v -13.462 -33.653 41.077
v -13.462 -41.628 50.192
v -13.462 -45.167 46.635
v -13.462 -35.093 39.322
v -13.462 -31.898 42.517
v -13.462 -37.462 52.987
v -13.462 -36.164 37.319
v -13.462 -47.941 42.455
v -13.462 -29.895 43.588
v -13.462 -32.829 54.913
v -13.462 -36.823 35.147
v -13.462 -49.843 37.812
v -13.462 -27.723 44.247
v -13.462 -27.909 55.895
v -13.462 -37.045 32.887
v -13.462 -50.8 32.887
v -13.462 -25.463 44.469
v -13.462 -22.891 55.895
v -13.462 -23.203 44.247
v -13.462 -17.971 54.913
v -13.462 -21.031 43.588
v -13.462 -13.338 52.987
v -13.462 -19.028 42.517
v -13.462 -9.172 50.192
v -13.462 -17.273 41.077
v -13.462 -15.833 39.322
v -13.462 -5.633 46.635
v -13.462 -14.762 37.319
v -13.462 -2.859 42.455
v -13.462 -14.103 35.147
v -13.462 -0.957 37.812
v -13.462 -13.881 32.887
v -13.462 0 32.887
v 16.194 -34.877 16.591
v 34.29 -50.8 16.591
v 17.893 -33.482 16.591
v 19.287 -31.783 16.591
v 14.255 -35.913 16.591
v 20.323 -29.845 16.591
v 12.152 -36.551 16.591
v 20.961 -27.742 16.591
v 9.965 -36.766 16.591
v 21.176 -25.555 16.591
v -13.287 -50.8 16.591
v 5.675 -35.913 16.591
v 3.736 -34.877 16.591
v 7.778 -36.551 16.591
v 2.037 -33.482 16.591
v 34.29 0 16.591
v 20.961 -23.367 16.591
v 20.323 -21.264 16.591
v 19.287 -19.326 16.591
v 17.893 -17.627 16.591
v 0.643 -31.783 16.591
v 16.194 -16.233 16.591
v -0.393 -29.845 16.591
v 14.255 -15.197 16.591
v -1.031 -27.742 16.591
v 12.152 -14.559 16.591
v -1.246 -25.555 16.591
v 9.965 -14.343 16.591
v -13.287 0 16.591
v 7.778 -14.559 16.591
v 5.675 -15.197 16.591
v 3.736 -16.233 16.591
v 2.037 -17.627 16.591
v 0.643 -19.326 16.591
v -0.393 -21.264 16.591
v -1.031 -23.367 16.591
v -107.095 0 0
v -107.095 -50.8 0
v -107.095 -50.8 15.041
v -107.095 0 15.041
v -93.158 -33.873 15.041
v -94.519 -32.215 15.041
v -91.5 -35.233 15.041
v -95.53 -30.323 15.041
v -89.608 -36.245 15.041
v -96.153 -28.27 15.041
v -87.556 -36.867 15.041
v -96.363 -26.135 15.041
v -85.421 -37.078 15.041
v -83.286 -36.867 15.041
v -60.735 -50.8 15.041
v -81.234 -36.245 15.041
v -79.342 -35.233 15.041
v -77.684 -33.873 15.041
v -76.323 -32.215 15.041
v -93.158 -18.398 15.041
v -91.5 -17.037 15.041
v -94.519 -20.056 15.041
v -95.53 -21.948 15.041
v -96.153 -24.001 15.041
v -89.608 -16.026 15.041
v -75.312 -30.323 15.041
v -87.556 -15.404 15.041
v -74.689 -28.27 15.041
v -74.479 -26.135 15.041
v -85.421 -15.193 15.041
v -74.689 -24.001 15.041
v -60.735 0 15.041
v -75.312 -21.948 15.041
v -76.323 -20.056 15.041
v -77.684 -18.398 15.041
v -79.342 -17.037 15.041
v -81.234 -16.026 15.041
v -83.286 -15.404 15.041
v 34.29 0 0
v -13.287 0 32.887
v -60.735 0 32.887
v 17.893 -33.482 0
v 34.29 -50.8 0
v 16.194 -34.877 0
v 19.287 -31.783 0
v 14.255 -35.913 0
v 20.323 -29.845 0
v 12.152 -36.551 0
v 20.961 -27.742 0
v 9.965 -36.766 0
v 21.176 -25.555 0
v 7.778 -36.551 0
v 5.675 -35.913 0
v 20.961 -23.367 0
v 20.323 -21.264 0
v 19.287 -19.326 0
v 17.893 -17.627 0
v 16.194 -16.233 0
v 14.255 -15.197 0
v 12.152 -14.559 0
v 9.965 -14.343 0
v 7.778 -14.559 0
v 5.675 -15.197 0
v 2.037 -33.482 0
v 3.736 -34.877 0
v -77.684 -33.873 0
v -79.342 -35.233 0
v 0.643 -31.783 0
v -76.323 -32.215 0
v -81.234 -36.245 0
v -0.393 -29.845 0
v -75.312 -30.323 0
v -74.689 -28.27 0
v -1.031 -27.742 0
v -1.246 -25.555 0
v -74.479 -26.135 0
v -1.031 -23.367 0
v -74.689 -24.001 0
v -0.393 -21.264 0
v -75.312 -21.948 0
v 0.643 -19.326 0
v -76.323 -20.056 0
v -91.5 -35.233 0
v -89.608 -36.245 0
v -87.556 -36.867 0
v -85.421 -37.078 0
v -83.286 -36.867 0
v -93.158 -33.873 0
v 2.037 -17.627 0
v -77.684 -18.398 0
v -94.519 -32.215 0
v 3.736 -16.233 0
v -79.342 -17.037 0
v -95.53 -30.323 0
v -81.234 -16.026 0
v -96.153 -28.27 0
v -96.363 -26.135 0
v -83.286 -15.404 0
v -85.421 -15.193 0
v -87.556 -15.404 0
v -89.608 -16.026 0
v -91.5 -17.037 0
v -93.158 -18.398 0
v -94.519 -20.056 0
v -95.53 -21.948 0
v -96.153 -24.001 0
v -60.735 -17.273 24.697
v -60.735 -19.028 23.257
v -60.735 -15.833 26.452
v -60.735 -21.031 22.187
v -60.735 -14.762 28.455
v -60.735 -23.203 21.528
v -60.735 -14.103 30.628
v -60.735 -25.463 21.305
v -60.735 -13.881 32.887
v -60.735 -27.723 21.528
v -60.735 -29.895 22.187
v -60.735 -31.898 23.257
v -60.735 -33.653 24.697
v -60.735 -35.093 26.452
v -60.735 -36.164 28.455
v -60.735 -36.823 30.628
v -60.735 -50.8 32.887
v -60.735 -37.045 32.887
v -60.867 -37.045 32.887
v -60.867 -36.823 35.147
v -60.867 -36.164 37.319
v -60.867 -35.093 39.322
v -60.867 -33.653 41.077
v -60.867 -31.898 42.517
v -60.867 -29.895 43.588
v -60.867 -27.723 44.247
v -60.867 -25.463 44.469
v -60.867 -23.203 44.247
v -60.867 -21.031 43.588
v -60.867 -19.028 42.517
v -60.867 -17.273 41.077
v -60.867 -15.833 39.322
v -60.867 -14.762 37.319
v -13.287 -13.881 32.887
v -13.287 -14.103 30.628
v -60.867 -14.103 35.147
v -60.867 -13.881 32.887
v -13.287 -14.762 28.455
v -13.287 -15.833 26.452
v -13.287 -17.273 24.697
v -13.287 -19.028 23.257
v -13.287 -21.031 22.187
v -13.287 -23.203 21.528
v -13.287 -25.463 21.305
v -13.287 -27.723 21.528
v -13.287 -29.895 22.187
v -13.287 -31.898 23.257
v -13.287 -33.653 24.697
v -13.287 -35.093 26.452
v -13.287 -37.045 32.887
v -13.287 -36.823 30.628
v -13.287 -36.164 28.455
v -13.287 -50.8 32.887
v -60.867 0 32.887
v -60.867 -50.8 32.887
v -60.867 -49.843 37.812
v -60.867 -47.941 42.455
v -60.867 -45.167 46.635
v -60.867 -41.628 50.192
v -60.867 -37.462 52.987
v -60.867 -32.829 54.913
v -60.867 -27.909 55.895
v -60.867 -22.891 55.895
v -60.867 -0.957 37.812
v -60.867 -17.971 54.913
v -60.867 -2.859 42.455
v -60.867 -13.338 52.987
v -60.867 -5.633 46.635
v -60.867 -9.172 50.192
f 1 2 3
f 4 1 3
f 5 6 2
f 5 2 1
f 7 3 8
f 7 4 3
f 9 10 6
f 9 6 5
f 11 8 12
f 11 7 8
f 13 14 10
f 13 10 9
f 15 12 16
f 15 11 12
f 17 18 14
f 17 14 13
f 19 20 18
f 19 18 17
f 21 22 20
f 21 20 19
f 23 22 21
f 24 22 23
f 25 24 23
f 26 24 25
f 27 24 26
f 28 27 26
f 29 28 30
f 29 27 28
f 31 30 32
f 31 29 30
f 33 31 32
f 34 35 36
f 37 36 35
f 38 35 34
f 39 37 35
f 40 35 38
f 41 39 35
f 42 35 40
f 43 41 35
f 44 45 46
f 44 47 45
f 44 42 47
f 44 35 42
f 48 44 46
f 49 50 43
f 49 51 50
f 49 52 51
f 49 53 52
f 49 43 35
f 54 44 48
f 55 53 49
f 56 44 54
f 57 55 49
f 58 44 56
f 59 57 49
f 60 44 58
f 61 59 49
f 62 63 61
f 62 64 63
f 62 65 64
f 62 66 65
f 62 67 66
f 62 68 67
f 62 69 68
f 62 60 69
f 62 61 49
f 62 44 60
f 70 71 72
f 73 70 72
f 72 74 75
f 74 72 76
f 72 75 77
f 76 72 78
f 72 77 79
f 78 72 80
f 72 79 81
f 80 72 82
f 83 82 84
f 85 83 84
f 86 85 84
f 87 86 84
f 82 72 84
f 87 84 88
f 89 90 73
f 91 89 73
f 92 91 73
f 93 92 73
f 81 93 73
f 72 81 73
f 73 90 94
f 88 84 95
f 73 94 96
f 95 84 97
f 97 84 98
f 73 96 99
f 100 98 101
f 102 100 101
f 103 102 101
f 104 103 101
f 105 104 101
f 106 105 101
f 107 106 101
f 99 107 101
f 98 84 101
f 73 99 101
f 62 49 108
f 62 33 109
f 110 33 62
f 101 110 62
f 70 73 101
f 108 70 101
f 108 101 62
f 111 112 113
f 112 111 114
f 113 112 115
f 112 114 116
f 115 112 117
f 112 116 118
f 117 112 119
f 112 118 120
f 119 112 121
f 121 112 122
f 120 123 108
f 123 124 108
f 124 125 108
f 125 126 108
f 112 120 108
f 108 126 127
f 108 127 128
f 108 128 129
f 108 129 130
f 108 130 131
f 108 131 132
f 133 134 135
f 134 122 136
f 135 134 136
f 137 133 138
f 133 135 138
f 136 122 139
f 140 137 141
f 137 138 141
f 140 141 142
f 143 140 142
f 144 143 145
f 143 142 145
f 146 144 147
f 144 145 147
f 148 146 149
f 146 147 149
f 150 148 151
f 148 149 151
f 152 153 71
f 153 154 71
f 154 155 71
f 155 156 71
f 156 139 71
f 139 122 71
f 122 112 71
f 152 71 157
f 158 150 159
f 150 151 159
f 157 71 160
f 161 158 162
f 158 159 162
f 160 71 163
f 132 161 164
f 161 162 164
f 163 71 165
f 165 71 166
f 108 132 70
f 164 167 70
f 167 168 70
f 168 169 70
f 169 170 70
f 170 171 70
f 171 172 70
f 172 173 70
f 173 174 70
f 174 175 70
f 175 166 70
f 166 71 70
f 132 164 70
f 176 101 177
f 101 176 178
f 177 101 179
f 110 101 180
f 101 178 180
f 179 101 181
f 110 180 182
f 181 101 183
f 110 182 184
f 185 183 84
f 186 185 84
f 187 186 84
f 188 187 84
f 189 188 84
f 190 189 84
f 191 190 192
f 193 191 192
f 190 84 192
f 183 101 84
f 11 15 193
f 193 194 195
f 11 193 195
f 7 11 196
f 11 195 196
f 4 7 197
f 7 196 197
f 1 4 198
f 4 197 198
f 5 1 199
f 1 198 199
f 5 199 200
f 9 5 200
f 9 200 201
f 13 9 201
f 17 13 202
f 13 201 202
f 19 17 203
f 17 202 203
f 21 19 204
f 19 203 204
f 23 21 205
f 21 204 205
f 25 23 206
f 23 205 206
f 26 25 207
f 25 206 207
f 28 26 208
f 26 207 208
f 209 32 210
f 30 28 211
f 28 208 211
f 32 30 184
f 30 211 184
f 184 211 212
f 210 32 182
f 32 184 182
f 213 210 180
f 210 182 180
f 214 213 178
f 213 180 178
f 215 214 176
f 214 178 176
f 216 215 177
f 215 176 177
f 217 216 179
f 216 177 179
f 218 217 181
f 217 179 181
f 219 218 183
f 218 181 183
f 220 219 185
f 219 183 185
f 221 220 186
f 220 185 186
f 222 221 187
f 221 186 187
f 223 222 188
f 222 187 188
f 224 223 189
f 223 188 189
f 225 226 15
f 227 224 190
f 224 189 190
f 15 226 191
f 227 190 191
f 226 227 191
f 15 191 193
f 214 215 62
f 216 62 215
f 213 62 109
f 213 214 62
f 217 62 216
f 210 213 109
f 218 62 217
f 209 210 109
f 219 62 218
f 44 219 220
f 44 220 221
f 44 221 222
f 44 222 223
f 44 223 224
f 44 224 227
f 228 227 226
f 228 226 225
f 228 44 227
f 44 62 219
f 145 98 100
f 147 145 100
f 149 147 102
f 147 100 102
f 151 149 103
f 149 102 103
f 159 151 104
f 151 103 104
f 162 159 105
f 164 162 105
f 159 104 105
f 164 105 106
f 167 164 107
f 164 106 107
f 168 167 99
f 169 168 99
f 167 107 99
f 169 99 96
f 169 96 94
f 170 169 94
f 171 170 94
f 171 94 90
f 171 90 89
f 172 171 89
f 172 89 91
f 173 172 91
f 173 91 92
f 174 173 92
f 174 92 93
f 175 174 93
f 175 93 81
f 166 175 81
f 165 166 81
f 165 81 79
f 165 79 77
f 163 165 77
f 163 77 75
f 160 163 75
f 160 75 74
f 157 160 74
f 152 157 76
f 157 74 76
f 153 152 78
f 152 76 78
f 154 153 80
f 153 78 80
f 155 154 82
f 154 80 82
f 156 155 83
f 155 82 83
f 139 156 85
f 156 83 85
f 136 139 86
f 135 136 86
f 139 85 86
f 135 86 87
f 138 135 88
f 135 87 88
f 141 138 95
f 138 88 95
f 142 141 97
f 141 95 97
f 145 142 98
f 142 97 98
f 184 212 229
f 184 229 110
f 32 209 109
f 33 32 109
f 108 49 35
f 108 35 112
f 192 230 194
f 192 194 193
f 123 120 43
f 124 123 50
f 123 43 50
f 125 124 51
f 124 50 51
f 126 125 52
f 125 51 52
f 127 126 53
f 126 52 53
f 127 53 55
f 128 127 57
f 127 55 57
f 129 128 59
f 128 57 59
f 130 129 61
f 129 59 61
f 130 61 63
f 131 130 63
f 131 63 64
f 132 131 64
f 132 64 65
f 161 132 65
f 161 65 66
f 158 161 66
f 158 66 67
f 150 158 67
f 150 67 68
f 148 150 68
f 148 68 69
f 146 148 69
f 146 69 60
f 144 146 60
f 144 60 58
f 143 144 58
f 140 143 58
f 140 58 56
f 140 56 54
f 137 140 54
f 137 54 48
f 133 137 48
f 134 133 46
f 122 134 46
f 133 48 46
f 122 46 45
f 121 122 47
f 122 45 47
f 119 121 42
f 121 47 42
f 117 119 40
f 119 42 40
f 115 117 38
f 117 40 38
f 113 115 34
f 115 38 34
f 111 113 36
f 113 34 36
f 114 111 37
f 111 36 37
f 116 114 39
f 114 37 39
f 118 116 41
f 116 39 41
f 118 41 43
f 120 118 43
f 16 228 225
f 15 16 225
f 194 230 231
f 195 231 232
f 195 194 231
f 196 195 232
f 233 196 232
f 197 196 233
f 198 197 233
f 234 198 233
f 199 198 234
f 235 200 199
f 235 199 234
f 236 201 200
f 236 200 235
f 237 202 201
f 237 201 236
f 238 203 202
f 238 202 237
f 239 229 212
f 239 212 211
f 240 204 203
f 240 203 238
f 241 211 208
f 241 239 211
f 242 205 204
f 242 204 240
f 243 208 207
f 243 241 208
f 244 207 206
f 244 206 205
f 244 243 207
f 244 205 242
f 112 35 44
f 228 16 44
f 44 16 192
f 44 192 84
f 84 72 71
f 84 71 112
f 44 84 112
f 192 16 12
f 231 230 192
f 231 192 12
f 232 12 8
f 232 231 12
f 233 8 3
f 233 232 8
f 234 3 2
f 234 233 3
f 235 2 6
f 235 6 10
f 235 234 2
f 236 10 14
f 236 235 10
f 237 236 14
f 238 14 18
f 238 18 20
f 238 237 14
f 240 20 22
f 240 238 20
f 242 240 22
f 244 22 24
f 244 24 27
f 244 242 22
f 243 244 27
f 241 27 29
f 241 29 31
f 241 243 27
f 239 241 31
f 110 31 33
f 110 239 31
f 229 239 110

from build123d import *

# Parameters (mm, degrees)
F0_W      = 74.5829641819
F0_H      = 30.8565702289
F1_DEPTH  = 25.4
F2_DEPTH  = 25.4
F3_DEPTH  = 25.4
F4_DEPTH  = 25.4
F6_DEPTH  = 25.4
F7_DEPTH  = 151.384
F8_DEPTH  = 25.4
F9_W      = 39.2481669128
F9_H      = 17.8465423578
F12_DEPTH = 60.198
F10_W     = 38.687005946
F10_H     = 16.2959610515
F13_DEPTH = 64.262
F14_DEPTH = 39.116
F15_DEPTH = 38.862
F16_DEPTH = 25.4
F17_DEPTH = 25.4
F19_DEPTH = 107.442
F21_DEPTH = 58.166
F22_DEPTH = 25.4
F23_DEPTH = 25.4
F24_DEPTH = 16.51
F25_DEPTH = 18.288
F26_R     = 11.2114596222
F27_DEPTH = 45.72
F28_R     = 10.9420459353
F29_DEPTH = 60.452


with BuildPart() as f1:
    # F0 (on Front) → F1 (new body)
    with BuildSketch(Plane.XZ):
        with Locations((-37.291482091, 15.4282851145)):
            Rectangle(F0_W, F0_H)
    extrude(amount=F1_DEPTH)

    # F2 (add): a face of the model
    f2_faces = [f1.faces().sort_by_distance(p)[0] for p in [
        (-74.5829641819, -12.7, 15.4282851145),
    ]]
    extrude(f2_faces, amount=F2_DEPTH)

    # F3 (add): a face of the model
    f3_faces = [f1.faces().sort_by_distance(p)[0] for p in [
        (-49.991482091, -12.7, 30.8565702289),
    ]]
    extrude(f3_faces, amount=F3_DEPTH)

    # F4 (add): a face of the model
    f4_faces = [f1.faces().sort_by_distance(p)[0] for p in [
        (-49.991482091, -25.4, 28.1282851145),
    ]]
    extrude(f4_faces, amount=F4_DEPTH)

    # F5 (on face) → F6 (cut)
    with BuildSketch(Plane(origin=(-99.9829641819, 0, 0), x_dir=(0, -1, 0), z_dir=(-1, 0, 0))):
        with BuildLine():
            ThreePointArc((0, 32.8871821457), (25.4, 56.0189424458), (50.8, 32.8871821457))
            Line((50.8, 32.8871821457), (50.8, 56.2565702289))
            Line((50.8, 56.2565702289), (0, 56.2565702289))
            Line((0, 56.2565702289), (0, 32.8871821457))
        make_face()
    extrude(amount=-F6_DEPTH, mode=Mode.SUBTRACT)

    # F7 (cut): a face of the model
    f7_faces = [f1.faces().sort_by_distance(p)[0] for p in [
        (-74.5829641819, -25.4, 56.0748599591),
    ]]
    extrude(f7_faces, amount=-F7_DEPTH, mode=Mode.SUBTRACT)

    # F8 (add): a face of the model
    f8_faces = [f1.faces().sort_by_distance(p)[0] for p in [
        (0, -25.4, 25.6193021496),
    ]]
    extrude(f8_faces, amount=F8_DEPTH)

    # F9 (on face) → F12 (cut)
    with BuildSketch(Plane.XZ.offset(50.8)):
        with Locations((-80.3588807255, 23.9639109668)):
            Rectangle(F9_W, F9_H)
    extrude(amount=-F12_DEPTH, mode=Mode.SUBTRACT)

    # F10 (on face) → F13 (cut)
    with BuildSketch(Plane.XZ.offset(50.8)):
        with Locations((6.056497027, 24.7392016199)):
            Rectangle(F10_W, F10_H)
    extrude(amount=-F13_DEPTH, mode=Mode.SUBTRACT)

    # F14 (cut): a face of the model
    f14_faces = [f1.faces().sort_by_distance(p)[0] for p in [
        (-99.9829641819, -25.4, 42.6317575384),
    ]]
    extrude(f14_faces, amount=-F14_DEPTH, mode=Mode.SUBTRACT)

    # F15 (cut): a face of the model
    f15_faces = [f1.faces().sort_by_distance(p)[0] for p in [
        (25.4, -25.4, 42.6317575384),
    ]]
    extrude(f15_faces, amount=-F15_DEPTH, mode=Mode.SUBTRACT)

    # F16 (add): a face of the model
    f16_faces = [f1.faces().sort_by_distance(p)[0] for p in [
        (-99.9829641819, -25.4, 7.520319894),
    ]]
    extrude(f16_faces, amount=F16_DEPTH)

    # F17 (add): a face of the model
    f17_faces = [f1.faces().sort_by_distance(p)[0] for p in [
        (25.4, -25.4, 8.2956105471),
    ]]
    extrude(f17_faces, amount=F17_DEPTH)

    # F18 (on face) → F19 (cut)
    with BuildSketch(Plane.YZ.offset(-13.287005946)):
        with BuildLine():
            Line((-35.7976081282, 32.8871821457), (-15.1284308589, 32.8871821457))
            ThreePointArc((-15.1284308589, 32.8871821457), (-25.4630194936, 41.1995819956), (-35.7976081282, 32.8871821457))
        make_face()
    extrude(amount=-F19_DEPTH, mode=Mode.SUBTRACT)

    # F20 (on face) → F21 (cut)
    with BuildSketch(Plane(origin=(-60.7347972691, 0, 0), x_dir=(0, -1, 0), z_dir=(-1, 0, 0))):
        with BuildLine():
            ThreePointArc((13.880819181, 32.8871821457), (25.4630194936, 21.3049818331), (37.0452198061, 32.8871821457))
            Line((37.0452198061, 32.8871821457), (35.7976081282, 32.8871821457))
            Line((35.7976081282, 32.8871821457), (15.1284308589, 32.8871821457))
            Line((15.1284308589, 32.8871821457), (13.880819181, 32.8871821457))
        make_face()
        with BuildLine():
            Line((35.7976081282, 32.8871821457), (37.0452198061, 32.8871821457))
            ThreePointArc((37.0452198061, 32.8871821457), (25.4630194936, 44.4693824582), (13.880819181, 32.8871821457))
            Line((13.880819181, 32.8871821457), (15.1284308589, 32.8871821457))
            Line((15.1284308589, 32.8871821457), (35.7976081282, 32.8871821457))
        make_face()
    extrude(amount=-F21_DEPTH, mode=Mode.SUBTRACT)

    # F22 (cut): a face of the model
    f22_faces = [f1.faces().sort_by_distance(p)[0] for p in [
        (-60.7347972691, -36.4214139672, 33.146168018),
    ]]
    extrude(f22_faces, amount=F22_DEPTH, mode=Mode.SUBTRACT)

    # F23 (cut): a face of the model
    f23_faces = [f1.faces().sort_by_distance(p)[0] for p in [
        (-60.7347972691, -36.4214139672, 33.146168018),
    ]]
    extrude(f23_faces, amount=-F23_DEPTH, mode=Mode.SUBTRACT)

    # F24 (cut): a face of the model
    f24_faces = [f1.faces().sort_by_distance(p)[0] for p in [
        (50.8, -25.4, 8.2956105471),
    ]]
    extrude(f24_faces, amount=-F24_DEPTH, mode=Mode.SUBTRACT)

    # F25 (cut): a face of the model
    f25_faces = [f1.faces().sort_by_distance(p)[0] for p in [
        (-125.3829641819, -25.4, 7.520319894),
    ]]
    extrude(f25_faces, amount=-F25_DEPTH, mode=Mode.SUBTRACT)

    # F26 (on face) → F27 (cut)
    with BuildSketch(Plane.XY.offset(16.5912210941)):
        with Locations((9.9650174379, -25.5547314882)):
            Circle(F26_R)
    extrude(amount=-F27_DEPTH, mode=Mode.SUBTRACT)

    # F28 (on face) → F29 (cut)
    with BuildSketch(Plane.XY.offset(15.0406397879)):
        with Locations((-85.4209959507, -26.1354632676)):
            Circle(F28_R)
    extrude(amount=-F29_DEPTH, mode=Mode.SUBTRACT)


solid = f1.part
